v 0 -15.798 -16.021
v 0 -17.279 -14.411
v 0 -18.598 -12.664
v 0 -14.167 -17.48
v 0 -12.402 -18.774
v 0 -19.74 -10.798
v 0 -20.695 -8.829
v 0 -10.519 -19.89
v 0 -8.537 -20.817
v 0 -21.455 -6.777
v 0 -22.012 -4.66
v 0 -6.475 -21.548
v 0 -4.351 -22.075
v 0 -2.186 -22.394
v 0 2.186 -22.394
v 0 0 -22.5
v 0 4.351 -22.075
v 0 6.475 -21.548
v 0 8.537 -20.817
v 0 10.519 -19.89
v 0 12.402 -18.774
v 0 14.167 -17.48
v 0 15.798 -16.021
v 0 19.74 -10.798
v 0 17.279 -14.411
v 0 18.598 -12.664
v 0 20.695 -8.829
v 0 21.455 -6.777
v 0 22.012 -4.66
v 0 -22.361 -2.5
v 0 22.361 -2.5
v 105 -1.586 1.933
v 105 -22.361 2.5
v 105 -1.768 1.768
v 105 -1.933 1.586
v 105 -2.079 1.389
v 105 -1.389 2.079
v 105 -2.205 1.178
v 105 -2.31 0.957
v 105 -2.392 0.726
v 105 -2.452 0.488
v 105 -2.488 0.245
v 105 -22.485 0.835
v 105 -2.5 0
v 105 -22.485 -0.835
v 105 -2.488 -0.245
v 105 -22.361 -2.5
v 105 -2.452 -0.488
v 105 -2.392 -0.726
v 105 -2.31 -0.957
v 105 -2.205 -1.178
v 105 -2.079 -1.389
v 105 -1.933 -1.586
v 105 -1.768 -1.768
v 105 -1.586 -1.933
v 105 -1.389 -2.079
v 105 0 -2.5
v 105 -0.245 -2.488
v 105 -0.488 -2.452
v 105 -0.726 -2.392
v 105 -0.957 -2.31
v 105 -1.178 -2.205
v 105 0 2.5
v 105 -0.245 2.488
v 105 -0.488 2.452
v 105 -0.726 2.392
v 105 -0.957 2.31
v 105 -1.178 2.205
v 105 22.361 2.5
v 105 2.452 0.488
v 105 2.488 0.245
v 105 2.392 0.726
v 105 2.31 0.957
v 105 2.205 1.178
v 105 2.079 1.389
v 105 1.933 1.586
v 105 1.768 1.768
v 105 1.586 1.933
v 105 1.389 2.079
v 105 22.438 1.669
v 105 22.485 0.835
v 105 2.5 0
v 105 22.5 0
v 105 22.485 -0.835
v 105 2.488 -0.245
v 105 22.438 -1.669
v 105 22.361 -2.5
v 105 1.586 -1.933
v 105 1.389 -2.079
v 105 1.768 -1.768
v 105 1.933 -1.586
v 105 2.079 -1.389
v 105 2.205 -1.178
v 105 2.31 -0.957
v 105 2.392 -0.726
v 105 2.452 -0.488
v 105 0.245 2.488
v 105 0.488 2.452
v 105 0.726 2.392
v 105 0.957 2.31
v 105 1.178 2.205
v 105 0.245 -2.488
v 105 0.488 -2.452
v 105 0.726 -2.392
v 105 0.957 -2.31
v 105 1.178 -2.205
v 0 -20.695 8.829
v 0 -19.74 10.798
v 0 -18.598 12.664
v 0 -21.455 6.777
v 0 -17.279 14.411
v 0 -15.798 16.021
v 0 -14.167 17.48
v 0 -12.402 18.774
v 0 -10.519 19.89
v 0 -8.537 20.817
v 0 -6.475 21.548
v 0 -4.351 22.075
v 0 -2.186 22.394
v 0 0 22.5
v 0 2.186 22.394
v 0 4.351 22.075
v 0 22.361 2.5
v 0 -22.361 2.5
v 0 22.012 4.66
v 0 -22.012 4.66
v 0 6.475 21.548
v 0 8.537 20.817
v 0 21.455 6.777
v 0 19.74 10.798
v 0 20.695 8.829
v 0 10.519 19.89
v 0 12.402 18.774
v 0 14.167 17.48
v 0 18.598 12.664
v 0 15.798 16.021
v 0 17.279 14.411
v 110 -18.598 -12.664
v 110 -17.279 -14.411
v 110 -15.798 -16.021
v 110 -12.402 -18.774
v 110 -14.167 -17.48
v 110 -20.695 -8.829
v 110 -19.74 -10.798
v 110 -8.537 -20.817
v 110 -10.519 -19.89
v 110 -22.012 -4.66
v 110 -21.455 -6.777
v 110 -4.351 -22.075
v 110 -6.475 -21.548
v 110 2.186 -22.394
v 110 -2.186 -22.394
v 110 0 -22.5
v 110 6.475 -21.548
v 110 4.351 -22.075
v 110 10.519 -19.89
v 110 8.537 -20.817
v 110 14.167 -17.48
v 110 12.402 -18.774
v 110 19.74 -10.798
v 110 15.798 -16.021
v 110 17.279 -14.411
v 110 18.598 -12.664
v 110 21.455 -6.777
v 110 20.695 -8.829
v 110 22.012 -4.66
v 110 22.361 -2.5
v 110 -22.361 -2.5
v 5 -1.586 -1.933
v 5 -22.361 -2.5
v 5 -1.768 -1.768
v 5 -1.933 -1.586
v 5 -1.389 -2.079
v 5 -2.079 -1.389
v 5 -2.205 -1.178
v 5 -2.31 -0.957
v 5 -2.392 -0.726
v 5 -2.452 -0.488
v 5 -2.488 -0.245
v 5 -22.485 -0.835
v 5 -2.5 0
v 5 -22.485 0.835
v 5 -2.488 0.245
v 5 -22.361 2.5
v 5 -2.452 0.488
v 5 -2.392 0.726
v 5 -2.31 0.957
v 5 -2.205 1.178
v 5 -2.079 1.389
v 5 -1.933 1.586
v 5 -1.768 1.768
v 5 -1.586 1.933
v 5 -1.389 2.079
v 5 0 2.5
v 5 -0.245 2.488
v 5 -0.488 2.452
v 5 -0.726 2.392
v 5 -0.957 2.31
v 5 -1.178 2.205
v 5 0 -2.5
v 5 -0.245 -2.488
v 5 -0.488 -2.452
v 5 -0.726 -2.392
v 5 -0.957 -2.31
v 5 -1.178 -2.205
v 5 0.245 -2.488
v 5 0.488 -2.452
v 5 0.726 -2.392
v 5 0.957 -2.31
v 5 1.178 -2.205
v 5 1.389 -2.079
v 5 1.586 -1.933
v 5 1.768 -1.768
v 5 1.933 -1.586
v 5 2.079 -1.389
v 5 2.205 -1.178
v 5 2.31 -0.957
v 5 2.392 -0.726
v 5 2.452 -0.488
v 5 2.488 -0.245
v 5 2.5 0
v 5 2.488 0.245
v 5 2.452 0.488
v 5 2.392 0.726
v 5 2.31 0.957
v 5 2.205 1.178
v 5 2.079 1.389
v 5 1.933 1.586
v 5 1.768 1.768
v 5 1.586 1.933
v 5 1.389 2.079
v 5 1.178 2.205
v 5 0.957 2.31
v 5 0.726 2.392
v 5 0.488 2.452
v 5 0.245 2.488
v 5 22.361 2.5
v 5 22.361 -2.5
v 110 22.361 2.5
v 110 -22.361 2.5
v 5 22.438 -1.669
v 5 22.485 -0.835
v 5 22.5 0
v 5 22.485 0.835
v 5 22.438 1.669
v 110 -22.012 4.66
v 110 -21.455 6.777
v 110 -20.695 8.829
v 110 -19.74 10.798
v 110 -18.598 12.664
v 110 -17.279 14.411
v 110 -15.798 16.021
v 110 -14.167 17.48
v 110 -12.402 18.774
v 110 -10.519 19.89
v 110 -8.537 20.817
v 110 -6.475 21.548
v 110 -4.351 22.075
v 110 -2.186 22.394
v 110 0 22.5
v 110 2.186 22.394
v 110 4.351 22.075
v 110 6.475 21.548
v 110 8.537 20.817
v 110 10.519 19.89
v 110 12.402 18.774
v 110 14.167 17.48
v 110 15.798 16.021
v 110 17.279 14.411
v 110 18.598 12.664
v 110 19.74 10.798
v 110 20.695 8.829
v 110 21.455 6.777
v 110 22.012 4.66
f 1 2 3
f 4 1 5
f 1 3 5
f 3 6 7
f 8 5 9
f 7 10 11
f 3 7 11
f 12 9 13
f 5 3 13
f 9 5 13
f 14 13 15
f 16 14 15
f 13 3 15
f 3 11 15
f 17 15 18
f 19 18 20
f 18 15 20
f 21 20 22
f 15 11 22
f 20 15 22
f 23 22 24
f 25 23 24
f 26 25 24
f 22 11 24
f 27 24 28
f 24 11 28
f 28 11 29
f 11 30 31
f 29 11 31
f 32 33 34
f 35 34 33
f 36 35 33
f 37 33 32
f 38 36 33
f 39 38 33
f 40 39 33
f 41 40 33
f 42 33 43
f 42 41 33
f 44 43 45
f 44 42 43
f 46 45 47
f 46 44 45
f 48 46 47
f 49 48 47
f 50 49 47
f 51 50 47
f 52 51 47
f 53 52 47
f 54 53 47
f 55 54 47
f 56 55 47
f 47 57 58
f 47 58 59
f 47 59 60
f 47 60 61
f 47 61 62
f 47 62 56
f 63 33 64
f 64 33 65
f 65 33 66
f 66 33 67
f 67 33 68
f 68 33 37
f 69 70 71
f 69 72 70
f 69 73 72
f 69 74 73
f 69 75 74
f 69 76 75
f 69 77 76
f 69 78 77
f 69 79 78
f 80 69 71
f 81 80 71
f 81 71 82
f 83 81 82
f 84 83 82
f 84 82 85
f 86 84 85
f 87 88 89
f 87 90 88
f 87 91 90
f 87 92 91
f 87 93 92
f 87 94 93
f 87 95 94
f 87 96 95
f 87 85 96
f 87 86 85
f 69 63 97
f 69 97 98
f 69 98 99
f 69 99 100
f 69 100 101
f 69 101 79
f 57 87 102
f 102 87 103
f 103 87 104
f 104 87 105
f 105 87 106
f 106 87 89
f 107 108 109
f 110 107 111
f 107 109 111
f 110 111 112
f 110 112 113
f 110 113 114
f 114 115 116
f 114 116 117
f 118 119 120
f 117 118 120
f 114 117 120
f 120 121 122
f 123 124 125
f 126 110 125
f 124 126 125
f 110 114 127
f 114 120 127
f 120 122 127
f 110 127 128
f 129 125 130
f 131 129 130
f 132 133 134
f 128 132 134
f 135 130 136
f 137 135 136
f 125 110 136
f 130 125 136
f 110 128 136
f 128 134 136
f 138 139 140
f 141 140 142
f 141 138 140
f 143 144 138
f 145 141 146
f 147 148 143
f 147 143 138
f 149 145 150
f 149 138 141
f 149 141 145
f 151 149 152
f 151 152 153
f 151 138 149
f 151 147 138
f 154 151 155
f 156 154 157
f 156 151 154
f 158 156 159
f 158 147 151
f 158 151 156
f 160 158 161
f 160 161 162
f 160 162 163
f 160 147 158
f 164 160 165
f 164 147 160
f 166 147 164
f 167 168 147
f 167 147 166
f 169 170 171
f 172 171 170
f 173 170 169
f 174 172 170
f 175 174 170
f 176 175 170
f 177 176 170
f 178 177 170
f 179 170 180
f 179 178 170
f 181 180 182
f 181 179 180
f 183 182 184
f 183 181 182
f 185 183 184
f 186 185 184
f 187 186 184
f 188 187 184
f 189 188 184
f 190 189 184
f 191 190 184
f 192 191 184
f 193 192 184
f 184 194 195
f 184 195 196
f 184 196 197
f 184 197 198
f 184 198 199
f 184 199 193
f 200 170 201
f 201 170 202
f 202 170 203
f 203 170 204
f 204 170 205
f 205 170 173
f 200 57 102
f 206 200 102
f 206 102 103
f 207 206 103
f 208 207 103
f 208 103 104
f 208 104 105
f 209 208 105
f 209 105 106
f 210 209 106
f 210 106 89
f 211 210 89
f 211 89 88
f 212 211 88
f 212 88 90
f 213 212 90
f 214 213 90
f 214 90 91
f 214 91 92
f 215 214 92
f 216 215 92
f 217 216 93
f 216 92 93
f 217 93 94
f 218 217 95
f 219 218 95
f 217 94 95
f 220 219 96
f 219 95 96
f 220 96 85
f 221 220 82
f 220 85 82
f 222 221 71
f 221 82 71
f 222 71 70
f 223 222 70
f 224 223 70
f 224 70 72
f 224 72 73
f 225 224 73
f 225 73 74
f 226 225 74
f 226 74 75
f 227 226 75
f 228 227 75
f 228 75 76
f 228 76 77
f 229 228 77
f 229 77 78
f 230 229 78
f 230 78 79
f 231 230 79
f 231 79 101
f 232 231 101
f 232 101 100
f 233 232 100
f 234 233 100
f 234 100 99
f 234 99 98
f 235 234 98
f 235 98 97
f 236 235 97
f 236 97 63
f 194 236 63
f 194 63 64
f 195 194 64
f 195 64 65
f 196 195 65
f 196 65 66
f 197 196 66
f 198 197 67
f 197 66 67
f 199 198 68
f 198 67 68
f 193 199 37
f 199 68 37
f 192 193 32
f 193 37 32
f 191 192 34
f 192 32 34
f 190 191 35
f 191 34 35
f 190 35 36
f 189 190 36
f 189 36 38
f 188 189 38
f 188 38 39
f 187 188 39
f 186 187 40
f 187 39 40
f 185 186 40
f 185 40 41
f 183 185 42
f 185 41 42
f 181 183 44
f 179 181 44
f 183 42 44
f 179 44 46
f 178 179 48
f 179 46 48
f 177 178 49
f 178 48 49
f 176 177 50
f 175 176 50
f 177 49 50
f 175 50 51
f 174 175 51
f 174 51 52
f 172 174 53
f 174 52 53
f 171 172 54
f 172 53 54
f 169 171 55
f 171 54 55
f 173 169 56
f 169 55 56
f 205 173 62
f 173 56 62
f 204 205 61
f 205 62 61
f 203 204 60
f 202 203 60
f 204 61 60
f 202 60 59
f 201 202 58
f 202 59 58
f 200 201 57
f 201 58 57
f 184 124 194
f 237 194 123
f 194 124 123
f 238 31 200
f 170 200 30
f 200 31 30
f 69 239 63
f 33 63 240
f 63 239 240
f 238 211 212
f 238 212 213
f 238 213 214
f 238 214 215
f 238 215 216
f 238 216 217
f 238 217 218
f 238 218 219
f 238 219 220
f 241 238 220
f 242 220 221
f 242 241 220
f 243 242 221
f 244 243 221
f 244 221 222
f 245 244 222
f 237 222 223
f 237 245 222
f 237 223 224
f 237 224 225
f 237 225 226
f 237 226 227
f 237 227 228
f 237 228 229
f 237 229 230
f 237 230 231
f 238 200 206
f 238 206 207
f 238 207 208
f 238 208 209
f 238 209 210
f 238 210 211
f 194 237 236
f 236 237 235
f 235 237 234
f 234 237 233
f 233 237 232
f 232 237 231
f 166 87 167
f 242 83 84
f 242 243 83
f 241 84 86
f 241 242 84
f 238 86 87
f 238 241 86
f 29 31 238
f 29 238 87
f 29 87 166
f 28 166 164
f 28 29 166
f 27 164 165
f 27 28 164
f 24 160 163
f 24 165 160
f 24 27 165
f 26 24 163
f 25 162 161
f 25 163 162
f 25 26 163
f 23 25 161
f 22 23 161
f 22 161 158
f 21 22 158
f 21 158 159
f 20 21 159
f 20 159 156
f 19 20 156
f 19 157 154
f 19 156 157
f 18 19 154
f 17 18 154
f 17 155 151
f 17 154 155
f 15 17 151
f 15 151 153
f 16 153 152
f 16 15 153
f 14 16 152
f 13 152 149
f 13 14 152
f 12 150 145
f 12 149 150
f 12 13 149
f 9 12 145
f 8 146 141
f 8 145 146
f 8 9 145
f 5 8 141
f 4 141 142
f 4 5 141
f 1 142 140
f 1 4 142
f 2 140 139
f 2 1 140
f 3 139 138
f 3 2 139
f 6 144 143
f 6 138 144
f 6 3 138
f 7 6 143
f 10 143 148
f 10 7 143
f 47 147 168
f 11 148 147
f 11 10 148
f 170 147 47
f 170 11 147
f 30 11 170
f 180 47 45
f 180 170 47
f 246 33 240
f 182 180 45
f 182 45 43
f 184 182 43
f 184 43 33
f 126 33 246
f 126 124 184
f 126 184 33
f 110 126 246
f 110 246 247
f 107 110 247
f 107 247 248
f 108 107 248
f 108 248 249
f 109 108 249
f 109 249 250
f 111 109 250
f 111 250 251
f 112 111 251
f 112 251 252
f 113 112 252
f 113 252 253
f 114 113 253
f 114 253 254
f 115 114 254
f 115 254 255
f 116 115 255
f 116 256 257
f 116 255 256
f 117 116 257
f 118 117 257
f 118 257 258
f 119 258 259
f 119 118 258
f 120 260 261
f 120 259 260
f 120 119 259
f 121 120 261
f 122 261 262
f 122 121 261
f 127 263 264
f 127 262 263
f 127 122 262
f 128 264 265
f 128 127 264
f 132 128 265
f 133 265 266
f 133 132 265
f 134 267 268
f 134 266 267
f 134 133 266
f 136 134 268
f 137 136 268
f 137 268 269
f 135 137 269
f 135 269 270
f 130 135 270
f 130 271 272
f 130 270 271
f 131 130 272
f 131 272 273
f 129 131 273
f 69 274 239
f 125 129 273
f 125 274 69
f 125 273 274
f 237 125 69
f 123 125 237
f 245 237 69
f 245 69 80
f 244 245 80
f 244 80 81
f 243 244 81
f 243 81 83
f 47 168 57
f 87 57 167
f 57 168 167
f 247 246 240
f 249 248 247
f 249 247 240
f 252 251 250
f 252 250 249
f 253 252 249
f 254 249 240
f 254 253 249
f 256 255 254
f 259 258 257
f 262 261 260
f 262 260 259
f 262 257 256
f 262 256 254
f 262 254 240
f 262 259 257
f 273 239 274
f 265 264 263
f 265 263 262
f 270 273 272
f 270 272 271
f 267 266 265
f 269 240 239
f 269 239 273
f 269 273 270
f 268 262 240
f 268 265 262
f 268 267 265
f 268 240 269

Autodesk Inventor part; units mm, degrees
ref_plane "YZ Plane" through (0, 0, 0) normal (1, 0, 0) x (0, 1, 0)
ref_plane "XZ Plane" through (0, 0, 0) normal (0, 1, 0) x (-1, 0, 0)
ref_plane "XY Plane" through (0, 0, 0) normal (0, 0, 1) x (1, 0, 0)
sketch "Sketch1" plane through (0, 0, 0) normal (1, 0, 0) x (0, 1, 0)
  circle A0 centre (0, 0) radius 22.5
  dimension "d0" = 45
extrude "Extrusion1" add sketch "Sketch1" along normal blind 110
sketch "Sketch2" plane through (110, 0, 0) normal (1, 0, 0) x (0, 0, -1)
  line L0 (2.5, 26.6733) -> (-2.5, 26.6733)
  line L1 (-2.5, 26.6733) -> (-2.5, -26.6733)
  line L2 (-2.5, -26.6733) -> (2.5, -26.6733)
  line L3 (2.5, -26.6733) -> (2.5, 26.6733)
  line L4 (2.5, 26.6733) -> (-2.5, -26.6733) construction
  line L5 (-2.5, 26.6733) -> (2.5, -26.6733) construction
  circle A0 centre (0, 0) radius 2.5
  dimension "d3" = 5
  dimension "d12" = 5
extrude "Extrusion2" cut sketch "Sketch2" against normal blind 5
sketch "Sketch4" plane through (0, 0, 0) normal (-1, 0, 0) x (0, 0, 1)
  line L0 (-2.5, -27.3209) -> (2.5, -27.3209)
  line L1 (2.5, -27.3209) -> (2.5, 27.3209)
  line L2 (2.5, 27.3209) -> (-2.5, 27.3209)
  line L3 (-2.5, 27.3209) -> (-2.5, -27.3209)
  line L4 (-2.5, -27.3209) -> (2.5, 27.3209) construction
  line L5 (2.5, -27.3209) -> (-2.5, 27.3209) construction
  point P0 (0, 0)
  dimension "d9" = 5
extrude "Extrusion4" cut sketch "Sketch4" against normal blind 5
sketch "Sketch5" plane through (105, 0, 0) normal (1, 0, 0) x (0, 0, -1)
  circle A0 centre (0, 0) radius 2.5
  dimension "d13" = 5
extrude "Extrusion5" cut sketch "Sketch5" against normal blind 110
properties part number "Conveyor Belt Shaft" material "Stainless Steel AISI 440C, Welded"
